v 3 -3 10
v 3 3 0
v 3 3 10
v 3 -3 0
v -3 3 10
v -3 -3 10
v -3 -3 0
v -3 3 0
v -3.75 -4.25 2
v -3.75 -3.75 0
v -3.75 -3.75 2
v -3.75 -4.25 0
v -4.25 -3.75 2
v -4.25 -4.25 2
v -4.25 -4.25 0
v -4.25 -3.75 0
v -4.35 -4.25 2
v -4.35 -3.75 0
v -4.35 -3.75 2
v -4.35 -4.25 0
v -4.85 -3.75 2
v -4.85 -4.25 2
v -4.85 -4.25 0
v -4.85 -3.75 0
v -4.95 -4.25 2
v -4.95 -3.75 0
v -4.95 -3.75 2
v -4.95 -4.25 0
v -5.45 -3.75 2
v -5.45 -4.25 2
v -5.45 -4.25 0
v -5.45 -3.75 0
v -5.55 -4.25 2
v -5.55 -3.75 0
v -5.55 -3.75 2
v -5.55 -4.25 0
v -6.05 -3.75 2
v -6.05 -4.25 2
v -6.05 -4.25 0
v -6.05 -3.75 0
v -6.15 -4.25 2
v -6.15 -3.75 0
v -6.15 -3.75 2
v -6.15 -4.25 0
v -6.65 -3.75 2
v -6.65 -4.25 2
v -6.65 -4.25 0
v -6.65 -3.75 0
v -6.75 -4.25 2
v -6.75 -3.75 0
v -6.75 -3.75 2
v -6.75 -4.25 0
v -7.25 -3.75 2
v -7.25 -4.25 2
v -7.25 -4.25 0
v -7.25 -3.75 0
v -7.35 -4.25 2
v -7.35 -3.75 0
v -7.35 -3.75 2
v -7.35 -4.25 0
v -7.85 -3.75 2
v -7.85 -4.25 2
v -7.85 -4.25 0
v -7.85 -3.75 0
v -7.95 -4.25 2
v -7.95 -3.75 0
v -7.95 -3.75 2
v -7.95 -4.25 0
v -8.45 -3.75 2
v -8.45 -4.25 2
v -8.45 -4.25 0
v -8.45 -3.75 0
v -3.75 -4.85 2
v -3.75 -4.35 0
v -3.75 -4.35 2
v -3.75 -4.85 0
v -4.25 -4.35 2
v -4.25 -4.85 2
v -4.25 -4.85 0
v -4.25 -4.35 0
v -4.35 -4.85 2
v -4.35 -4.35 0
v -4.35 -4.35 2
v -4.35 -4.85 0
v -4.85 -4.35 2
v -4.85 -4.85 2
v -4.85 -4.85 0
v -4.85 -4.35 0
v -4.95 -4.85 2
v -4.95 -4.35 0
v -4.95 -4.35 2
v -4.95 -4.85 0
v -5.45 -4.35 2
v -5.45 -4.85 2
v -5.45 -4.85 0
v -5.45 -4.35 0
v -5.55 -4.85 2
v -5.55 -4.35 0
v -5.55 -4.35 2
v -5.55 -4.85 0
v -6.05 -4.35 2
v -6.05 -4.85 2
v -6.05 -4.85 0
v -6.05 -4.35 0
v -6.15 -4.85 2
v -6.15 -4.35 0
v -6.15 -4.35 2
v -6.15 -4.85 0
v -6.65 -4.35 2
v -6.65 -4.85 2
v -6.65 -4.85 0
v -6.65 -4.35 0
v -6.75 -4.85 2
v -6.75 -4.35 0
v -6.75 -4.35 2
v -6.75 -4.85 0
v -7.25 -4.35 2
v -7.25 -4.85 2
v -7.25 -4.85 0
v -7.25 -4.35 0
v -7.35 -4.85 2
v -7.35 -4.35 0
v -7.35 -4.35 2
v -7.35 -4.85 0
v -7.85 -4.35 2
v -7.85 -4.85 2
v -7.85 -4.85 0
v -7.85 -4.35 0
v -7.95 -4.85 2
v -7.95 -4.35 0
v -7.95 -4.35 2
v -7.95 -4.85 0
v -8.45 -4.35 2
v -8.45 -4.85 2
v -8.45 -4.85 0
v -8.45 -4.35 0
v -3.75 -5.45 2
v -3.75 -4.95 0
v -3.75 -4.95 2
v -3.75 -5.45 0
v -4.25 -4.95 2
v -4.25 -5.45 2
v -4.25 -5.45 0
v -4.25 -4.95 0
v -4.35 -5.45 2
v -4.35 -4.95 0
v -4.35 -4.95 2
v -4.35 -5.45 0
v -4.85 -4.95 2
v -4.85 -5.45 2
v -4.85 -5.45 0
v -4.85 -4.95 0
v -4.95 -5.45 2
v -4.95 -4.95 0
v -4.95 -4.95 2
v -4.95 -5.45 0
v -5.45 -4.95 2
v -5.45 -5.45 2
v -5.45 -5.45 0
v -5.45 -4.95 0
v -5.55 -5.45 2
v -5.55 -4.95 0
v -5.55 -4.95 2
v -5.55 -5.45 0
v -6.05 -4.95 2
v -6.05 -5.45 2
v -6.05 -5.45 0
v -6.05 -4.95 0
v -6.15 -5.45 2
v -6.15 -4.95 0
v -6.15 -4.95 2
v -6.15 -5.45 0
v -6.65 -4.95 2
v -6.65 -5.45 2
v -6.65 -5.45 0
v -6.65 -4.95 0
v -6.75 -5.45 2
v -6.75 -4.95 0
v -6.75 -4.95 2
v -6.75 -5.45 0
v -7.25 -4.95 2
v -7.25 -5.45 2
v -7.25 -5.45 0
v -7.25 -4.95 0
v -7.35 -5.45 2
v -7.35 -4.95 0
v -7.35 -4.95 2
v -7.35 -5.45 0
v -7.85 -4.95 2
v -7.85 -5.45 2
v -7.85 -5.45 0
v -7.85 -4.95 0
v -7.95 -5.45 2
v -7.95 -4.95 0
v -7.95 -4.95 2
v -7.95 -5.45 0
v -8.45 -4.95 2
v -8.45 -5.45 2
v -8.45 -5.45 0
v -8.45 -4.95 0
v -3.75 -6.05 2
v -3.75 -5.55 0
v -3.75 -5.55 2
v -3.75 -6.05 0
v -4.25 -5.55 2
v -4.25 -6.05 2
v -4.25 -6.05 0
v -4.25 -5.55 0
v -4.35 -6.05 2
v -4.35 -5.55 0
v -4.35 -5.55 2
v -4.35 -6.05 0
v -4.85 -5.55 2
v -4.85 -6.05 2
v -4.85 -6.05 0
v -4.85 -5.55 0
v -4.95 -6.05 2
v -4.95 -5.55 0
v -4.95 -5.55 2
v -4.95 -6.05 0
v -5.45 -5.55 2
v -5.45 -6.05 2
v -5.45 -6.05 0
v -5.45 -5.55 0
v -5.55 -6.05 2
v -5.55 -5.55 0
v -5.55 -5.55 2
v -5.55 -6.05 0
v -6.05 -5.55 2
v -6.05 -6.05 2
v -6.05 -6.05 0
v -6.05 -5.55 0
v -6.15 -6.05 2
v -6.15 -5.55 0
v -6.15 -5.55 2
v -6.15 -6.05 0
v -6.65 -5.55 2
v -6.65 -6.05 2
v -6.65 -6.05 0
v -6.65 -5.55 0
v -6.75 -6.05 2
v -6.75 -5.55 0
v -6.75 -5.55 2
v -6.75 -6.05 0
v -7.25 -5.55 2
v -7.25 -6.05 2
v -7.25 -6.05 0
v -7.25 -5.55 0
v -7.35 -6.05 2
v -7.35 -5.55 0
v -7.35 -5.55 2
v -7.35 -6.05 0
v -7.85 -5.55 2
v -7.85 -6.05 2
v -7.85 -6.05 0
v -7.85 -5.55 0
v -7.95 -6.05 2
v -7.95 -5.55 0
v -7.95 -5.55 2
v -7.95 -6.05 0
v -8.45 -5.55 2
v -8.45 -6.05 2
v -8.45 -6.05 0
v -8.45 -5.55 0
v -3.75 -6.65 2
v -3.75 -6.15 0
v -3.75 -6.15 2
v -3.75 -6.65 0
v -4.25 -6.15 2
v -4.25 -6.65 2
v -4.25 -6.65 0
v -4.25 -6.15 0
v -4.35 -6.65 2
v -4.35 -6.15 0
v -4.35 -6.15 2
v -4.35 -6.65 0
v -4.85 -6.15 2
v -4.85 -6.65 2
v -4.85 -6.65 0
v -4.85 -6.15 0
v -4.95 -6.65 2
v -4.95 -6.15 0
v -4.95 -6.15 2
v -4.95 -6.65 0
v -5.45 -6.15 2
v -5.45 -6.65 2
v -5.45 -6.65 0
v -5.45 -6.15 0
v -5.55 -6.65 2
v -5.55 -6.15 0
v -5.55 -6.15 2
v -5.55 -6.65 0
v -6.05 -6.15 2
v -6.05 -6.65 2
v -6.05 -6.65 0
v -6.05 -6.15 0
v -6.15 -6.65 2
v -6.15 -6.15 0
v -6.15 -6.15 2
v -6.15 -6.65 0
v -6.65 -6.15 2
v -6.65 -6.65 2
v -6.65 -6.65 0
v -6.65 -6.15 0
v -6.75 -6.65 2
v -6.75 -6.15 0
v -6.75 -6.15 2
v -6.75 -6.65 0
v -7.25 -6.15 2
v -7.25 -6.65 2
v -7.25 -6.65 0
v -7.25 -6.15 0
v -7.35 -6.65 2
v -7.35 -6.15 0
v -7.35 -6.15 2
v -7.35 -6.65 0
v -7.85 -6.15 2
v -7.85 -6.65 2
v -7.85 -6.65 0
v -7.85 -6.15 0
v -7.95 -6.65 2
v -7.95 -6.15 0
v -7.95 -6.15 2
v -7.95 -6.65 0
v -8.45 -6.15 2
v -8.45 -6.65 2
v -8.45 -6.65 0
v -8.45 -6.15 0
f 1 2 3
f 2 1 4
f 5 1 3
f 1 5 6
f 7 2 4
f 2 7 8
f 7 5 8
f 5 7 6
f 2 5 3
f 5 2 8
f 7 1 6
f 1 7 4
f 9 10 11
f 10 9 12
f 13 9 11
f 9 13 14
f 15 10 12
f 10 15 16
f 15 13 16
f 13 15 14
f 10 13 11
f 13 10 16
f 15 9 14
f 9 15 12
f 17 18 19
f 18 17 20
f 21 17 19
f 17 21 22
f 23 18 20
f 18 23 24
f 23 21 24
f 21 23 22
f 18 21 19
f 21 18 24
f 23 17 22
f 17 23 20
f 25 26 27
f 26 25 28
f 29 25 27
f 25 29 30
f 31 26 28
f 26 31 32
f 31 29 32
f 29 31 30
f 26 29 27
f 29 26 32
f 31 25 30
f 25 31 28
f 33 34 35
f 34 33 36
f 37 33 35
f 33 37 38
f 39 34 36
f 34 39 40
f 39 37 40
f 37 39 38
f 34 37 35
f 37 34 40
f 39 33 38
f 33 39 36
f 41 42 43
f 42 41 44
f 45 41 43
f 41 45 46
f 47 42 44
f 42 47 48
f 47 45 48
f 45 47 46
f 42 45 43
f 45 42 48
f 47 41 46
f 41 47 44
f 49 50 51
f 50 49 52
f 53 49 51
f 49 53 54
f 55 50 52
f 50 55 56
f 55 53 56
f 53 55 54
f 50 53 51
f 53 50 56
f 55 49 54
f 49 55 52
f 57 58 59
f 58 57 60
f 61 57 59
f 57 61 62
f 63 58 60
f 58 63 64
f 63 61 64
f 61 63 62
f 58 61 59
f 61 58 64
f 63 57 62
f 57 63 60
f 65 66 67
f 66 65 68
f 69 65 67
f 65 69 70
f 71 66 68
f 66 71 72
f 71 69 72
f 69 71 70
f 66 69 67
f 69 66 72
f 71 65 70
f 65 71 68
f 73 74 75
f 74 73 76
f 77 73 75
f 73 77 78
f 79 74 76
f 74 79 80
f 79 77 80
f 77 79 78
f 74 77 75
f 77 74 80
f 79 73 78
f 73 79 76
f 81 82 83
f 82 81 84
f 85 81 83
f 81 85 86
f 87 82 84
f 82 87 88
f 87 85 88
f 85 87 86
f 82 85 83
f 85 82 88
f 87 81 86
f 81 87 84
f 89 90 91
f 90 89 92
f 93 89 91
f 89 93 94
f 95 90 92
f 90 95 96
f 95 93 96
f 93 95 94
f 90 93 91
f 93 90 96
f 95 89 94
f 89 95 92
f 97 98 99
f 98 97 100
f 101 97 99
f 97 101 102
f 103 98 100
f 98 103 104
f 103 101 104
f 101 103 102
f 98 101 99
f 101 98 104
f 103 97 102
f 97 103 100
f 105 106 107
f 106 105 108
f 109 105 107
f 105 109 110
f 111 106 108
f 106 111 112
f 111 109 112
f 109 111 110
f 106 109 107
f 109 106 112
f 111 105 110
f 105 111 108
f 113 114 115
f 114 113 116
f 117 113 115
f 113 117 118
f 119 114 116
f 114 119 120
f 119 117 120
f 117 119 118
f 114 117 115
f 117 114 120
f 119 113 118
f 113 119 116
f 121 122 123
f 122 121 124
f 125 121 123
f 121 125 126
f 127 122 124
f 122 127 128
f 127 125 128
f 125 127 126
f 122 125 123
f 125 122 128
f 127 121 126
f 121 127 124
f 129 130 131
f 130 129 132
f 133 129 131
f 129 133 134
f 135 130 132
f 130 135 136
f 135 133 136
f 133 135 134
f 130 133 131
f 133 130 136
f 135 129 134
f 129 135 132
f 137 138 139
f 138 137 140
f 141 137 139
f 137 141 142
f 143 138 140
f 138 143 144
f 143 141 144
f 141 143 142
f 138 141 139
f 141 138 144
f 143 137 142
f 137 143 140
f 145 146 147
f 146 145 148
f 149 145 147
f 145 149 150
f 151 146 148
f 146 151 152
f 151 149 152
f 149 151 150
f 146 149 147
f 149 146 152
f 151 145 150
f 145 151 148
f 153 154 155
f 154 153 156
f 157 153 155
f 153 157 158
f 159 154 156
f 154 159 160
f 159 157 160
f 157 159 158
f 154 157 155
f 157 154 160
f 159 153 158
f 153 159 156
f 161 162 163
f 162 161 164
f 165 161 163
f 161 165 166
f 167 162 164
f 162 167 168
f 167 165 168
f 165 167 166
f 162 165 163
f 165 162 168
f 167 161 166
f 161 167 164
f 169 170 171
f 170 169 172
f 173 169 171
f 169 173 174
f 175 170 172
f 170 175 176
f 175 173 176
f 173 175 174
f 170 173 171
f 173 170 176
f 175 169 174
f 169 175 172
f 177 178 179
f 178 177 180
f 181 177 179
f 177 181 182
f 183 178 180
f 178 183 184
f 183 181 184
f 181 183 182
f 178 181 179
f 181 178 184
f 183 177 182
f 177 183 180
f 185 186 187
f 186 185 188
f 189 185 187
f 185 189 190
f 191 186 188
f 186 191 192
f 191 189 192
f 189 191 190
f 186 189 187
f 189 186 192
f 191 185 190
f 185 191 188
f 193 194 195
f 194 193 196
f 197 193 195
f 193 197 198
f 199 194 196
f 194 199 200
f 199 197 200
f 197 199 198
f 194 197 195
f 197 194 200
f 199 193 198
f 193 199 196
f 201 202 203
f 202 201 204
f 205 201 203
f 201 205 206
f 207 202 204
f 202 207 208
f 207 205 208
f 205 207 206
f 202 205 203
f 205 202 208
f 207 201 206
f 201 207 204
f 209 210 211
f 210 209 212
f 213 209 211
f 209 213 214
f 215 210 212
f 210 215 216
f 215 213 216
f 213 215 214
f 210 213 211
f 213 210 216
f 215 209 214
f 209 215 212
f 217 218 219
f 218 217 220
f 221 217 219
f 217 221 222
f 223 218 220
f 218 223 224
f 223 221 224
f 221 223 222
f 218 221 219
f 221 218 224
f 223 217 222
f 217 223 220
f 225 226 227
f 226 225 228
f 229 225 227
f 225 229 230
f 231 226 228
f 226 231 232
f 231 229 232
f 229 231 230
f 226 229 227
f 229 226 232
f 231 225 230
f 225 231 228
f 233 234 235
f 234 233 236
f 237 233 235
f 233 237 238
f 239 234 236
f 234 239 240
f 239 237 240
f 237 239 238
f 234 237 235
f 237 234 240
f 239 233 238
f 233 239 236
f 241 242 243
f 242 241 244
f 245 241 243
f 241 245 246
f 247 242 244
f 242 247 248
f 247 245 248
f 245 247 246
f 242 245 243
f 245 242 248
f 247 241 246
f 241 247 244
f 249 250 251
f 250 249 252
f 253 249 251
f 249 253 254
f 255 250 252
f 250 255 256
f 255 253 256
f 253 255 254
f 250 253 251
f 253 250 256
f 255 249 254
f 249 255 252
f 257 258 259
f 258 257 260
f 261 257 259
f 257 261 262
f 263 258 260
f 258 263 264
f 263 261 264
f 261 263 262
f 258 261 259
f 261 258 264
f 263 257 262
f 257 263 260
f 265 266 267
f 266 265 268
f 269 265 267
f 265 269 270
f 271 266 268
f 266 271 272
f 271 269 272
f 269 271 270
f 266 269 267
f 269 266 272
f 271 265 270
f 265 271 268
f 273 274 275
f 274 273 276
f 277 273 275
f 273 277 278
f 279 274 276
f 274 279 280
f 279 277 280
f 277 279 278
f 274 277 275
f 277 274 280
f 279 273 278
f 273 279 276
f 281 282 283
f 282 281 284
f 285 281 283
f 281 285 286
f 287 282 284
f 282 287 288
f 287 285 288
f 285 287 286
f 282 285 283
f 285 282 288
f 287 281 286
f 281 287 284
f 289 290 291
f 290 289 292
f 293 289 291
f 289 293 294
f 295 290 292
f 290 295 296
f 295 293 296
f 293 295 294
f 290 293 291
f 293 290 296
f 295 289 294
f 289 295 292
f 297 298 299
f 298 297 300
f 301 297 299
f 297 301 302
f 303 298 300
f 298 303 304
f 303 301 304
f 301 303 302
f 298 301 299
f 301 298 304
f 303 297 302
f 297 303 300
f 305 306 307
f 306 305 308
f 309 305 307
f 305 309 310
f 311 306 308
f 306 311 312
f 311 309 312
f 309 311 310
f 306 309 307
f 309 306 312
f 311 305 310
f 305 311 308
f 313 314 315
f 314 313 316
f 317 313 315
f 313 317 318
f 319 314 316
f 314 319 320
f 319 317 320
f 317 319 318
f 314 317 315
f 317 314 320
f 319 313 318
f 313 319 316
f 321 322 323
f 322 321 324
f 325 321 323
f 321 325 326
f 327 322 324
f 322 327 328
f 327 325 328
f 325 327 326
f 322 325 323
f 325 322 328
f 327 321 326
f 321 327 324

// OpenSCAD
translate([0, 0, 5]) color([0,1,0,0.9]) cube([6, 6, 10], center=true);
translate([-4.0, -4.0, 1]) color([1,0,0]) cube([0.5, 0.5, 2], center=true);
translate([-4.6, -4.0, 1]) color([1,0,0]) cube([0.5, 0.5, 2], center=true);
translate([-5.2, -4.0, 1]) color([1,0,0]) cube([0.5, 0.5, 2], center=true);
translate([-5.8, -4.0, 1]) color([1,0,0]) cube([0.5, 0.5, 2], center=true);
translate([-6.4, -4.0, 1]) color([1,0,0]) cube([0.5, 0.5, 2], center=true);
translate([-7.0, -4.0, 1]) color([1,0,0]) cube([0.5, 0.5, 2], center=true);
translate([-7.6, -4.0, 1]) color([1,0,0]) cube([0.5, 0.5, 2], center=true);
translate([-8.2, -4.0, 1]) color([1,0,0]) cube([0.5, 0.5, 2], center=true);
translate([-4.0, -4.6, 1]) color([1,0,0]) cube([0.5, 0.5, 2], center=true);
translate([-4.6, -4.6, 1]) color([1,0,0]) cube([0.5, 0.5, 2], center=true);
translate([-5.2, -4.6, 1]) color([1,0,0]) cube([0.5, 0.5, 2], center=true);
translate([-5.8, -4.6, 1]) color([1,0,0]) cube([0.5, 0.5, 2], center=true);
translate([-6.4, -4.6, 1]) color([1,0,0]) cube([0.5, 0.5, 2], center=true);
translate([-7.0, -4.6, 1]) color([1,0,0]) cube([0.5, 0.5, 2], center=true);
translate([-7.6, -4.6, 1]) color([1,0,0]) cube([0.5, 0.5, 2], center=true);
translate([-8.2, -4.6, 1]) color([1,0,0]) cube([0.5, 0.5, 2], center=true);
translate([-4.0, -5.2, 1]) color([1,0,0]) cube([0.5, 0.5, 2], center=true);
translate([-4.6, -5.2, 1]) color([1,0,0]) cube([0.5, 0.5, 2], center=true);
translate([-5.2, -5.2, 1]) color([1,0,0]) cube([0.5, 0.5, 2], center=true);
translate([-5.8, -5.2, 1]) color([1,0,0]) cube([0.5, 0.5, 2], center=true);
translate([-6.4, -5.2, 1]) color([1,0,0]) cube([0.5, 0.5, 2], center=true);
translate([-7.0, -5.2, 1]) color([1,0,0]) cube([0.5, 0.5, 2], center=true);
translate([-7.6, -5.2, 1]) color([1,0,0]) cube([0.5, 0.5, 2], center=true);
translate([-8.2, -5.2, 1]) color([1,0,0]) cube([0.5, 0.5, 2], center=true);
translate([-4.0, -5.8, 1]) color([1,0,0]) cube([0.5, 0.5, 2], center=true);
translate([-4.6, -5.8, 1]) color([1,0,0]) cube([0.5, 0.5, 2], center=true);
translate([-5.2, -5.8, 1]) color([1,0,0]) cube([0.5, 0.5, 2], center=true);
translate([-5.8, -5.8, 1]) color([1,0,0]) cube([0.5, 0.5, 2], center=true);
translate([-6.4, -5.8, 1]) color([1,0,0]) cube([0.5, 0.5, 2], center=true);
translate([-7.0, -5.8, 1]) color([1,0,0]) cube([0.5, 0.5, 2], center=true);
translate([-7.6, -5.8, 1]) color([1,0,0]) cube([0.5, 0.5, 2], center=true);
translate([-8.2, -5.8, 1]) color([1,0,0]) cube([0.5, 0.5, 2], center=true);
translate([-4.0, -6.4, 1]) color([1,0,0]) cube([0.5, 0.5, 2], center=true);
translate([-4.6, -6.4, 1]) color([1,0,0]) cube([0.5, 0.5, 2], center=true);
translate([-5.2, -6.4, 1]) color([1,0,0]) cube([0.5, 0.5, 2], center=true);
translate([-5.8, -6.4, 1]) color([1,0,0]) cube([0.5, 0.5, 2], center=true);
translate([-6.4, -6.4, 1]) color([1,0,0]) cube([0.5, 0.5, 2], center=true);
translate([-7.0, -6.4, 1]) color([1,0,0]) cube([0.5, 0.5, 2], center=true);
translate([-7.6, -6.4, 1]) color([1,0,0]) cube([0.5, 0.5, 2], center=true);
translate([-8.2, -6.4, 1]) color([1,0,0]) cube([0.5, 0.5, 2], center=true);
